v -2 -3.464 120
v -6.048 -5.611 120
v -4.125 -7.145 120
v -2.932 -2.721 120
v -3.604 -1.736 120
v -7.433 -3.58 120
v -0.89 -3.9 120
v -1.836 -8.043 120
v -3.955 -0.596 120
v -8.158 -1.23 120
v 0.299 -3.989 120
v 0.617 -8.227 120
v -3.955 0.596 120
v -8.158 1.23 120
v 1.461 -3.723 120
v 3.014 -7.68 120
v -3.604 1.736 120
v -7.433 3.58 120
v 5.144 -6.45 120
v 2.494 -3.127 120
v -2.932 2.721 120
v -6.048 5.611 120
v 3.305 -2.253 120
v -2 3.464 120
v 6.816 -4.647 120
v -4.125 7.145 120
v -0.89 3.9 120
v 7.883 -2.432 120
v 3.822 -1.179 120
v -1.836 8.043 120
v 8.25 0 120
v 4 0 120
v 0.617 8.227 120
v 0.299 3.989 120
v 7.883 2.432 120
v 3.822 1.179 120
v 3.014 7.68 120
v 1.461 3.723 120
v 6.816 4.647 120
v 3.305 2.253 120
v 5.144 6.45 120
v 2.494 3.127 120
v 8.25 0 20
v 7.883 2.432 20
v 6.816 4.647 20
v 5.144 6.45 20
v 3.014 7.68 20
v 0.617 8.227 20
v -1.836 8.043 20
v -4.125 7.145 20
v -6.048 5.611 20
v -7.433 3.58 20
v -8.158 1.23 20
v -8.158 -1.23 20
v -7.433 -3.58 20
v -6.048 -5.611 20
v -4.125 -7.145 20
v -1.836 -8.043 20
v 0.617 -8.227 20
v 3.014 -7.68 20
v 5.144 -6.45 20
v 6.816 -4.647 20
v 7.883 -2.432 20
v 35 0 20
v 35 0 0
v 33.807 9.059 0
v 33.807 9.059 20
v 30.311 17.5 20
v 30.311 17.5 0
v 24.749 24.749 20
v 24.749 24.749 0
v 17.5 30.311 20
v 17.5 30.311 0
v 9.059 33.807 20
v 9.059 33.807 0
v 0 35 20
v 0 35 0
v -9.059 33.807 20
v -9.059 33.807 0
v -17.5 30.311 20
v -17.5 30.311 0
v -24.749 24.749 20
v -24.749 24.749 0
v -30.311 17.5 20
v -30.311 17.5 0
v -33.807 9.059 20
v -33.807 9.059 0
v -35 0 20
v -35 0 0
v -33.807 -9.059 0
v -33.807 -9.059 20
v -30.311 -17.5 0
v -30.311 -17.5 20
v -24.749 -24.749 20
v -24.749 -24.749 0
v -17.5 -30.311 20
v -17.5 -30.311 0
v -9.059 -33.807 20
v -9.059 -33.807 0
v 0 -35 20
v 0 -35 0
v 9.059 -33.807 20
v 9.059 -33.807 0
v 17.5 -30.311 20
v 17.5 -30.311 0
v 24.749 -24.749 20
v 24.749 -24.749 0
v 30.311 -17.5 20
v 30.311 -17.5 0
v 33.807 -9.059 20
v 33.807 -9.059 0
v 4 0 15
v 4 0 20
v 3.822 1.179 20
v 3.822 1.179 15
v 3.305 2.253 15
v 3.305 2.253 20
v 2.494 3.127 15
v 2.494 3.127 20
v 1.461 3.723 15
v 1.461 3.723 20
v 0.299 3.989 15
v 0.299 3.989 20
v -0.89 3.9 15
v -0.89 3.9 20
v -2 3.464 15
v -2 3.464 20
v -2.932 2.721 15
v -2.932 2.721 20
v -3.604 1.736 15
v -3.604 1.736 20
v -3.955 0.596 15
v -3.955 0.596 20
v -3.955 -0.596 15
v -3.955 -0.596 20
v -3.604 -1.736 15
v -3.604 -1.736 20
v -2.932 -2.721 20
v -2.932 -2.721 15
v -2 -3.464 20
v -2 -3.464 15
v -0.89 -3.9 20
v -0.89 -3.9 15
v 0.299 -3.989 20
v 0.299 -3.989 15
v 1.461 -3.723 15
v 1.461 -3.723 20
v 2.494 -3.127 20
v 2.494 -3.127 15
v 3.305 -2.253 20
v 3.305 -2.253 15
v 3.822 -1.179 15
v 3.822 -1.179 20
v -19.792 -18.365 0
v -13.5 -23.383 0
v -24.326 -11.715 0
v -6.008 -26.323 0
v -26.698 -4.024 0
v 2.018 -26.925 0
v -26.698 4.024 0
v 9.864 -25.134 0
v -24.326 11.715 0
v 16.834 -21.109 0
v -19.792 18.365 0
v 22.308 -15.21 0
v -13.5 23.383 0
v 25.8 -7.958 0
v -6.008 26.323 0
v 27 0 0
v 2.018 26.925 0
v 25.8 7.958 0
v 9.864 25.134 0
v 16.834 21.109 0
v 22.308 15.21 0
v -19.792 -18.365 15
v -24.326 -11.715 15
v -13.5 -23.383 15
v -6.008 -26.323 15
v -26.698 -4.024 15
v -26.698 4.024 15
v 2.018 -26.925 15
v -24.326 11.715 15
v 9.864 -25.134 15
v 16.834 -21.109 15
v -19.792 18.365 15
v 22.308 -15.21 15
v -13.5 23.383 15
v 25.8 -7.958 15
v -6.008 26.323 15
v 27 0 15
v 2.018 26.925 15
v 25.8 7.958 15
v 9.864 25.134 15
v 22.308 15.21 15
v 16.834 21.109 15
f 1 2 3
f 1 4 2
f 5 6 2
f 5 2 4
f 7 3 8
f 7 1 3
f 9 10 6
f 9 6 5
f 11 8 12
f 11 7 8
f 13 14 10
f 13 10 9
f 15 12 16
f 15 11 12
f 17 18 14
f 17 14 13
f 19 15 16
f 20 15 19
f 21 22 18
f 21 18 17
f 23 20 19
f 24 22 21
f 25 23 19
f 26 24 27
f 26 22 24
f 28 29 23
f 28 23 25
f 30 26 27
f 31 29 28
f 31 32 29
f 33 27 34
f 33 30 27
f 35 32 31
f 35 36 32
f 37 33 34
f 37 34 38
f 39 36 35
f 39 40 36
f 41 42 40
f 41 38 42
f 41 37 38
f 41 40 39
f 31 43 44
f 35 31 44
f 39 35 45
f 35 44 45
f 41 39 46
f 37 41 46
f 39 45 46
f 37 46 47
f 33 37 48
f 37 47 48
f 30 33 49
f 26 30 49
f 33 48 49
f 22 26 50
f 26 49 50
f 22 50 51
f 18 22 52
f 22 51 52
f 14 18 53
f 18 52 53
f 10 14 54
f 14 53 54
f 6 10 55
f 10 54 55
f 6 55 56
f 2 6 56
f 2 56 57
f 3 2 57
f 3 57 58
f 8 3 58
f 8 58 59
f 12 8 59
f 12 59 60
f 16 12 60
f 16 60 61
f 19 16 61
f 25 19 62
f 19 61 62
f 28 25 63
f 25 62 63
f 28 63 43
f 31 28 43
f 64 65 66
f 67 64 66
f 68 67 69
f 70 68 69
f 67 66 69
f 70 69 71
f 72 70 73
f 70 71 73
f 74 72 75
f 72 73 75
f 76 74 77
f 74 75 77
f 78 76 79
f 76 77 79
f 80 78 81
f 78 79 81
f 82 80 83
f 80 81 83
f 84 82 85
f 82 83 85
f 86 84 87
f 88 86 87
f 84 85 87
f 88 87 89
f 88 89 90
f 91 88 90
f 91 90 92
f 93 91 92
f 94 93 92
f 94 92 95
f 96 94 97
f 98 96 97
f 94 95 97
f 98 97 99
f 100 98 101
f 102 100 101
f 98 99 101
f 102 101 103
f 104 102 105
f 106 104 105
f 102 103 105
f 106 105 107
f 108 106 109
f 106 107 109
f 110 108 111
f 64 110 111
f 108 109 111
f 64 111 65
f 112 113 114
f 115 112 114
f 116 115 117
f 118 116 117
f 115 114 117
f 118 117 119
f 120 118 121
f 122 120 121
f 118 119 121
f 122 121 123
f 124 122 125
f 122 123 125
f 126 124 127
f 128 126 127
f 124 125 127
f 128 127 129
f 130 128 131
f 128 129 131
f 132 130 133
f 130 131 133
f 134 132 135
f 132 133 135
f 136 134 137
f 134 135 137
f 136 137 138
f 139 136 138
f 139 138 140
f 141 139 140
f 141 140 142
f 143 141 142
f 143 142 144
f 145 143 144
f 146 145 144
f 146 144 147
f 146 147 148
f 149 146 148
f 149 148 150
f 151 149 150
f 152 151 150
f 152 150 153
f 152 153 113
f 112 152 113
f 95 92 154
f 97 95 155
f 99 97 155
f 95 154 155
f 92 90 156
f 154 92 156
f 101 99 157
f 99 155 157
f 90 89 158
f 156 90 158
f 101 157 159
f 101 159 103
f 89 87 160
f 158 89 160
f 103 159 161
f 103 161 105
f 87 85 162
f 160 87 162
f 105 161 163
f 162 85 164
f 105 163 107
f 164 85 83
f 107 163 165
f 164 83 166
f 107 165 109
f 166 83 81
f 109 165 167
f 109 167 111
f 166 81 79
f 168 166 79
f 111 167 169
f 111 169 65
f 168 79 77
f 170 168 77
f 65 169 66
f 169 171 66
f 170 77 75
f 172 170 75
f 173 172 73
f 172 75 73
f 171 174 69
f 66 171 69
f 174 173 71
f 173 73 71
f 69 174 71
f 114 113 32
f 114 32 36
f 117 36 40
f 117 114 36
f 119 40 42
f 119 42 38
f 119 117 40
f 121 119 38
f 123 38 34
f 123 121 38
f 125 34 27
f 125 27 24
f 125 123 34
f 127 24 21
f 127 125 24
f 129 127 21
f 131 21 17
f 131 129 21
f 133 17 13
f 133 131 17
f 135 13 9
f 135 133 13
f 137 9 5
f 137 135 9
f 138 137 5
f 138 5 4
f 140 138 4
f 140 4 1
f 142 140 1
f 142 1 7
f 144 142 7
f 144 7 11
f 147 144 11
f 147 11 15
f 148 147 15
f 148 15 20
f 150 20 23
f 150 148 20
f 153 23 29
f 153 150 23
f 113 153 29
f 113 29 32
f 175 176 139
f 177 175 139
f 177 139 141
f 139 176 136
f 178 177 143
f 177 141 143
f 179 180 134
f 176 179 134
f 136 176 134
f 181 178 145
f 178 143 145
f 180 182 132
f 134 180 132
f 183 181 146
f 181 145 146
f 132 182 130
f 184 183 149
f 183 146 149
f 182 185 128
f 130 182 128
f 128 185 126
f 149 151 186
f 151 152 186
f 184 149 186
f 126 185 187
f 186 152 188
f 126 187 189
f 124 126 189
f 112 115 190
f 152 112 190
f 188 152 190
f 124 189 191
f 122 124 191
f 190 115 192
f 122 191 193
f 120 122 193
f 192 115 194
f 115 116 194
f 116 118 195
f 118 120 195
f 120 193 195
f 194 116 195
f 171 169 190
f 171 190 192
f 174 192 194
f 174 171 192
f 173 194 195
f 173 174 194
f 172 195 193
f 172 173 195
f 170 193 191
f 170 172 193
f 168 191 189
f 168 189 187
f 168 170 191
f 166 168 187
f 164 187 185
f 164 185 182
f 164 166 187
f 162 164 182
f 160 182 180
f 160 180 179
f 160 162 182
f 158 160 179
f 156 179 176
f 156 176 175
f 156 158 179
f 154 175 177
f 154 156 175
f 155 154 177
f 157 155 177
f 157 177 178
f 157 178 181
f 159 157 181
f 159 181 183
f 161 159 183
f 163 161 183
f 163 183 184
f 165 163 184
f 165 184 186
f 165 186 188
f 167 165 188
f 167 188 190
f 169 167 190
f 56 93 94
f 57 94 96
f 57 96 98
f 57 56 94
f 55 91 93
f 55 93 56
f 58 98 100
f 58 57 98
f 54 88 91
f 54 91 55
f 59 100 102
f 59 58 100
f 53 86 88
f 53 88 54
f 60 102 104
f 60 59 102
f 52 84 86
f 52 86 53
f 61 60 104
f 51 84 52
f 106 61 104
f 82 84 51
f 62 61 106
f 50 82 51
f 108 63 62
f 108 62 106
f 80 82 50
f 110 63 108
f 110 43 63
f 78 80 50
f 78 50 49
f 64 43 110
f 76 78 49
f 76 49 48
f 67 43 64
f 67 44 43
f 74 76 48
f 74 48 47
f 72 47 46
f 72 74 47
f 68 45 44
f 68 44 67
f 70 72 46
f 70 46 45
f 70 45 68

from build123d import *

# Parameters (mm, degrees)
F0_R     = 35
F0_R_2   = 27
F1_DEPTH = 20
F2_START = 15
F2_DEPTH = 5
F3_R     = 8.25
F3_R_2   = 4
F4_DEPTH = 100
F5_DEPTH = 12


with BuildPart() as f1:
    # F0 (on Top) → F1 (new body)
    with BuildSketch(Plane.XY):
        Circle(F0_R)
        Circle(F0_R_2, mode=Mode.SUBTRACT)
    extrude(amount=F1_DEPTH)

    # F0 (on Top) → F2 (join)
    with BuildSketch(Plane.XY.offset(F2_START)):
        Circle(F0_R_2)
    extrude(amount=F2_DEPTH)

    # F3 (on face) → F4 (join)
    with BuildSketch(Plane.XY.offset(20)):
        Circle(F3_R)
        Circle(F3_R_2, mode=Mode.SUBTRACT)
    extrude(amount=F4_DEPTH)

    # F5 (cut): a face of the model
    f5_faces = [f1.faces().sort_by_distance(p)[0] for p in [
        (0, 0, 20),
    ]]
    extrude(f5_faces, amount=-F5_DEPTH, mode=Mode.SUBTRACT)


solid = f1.part
